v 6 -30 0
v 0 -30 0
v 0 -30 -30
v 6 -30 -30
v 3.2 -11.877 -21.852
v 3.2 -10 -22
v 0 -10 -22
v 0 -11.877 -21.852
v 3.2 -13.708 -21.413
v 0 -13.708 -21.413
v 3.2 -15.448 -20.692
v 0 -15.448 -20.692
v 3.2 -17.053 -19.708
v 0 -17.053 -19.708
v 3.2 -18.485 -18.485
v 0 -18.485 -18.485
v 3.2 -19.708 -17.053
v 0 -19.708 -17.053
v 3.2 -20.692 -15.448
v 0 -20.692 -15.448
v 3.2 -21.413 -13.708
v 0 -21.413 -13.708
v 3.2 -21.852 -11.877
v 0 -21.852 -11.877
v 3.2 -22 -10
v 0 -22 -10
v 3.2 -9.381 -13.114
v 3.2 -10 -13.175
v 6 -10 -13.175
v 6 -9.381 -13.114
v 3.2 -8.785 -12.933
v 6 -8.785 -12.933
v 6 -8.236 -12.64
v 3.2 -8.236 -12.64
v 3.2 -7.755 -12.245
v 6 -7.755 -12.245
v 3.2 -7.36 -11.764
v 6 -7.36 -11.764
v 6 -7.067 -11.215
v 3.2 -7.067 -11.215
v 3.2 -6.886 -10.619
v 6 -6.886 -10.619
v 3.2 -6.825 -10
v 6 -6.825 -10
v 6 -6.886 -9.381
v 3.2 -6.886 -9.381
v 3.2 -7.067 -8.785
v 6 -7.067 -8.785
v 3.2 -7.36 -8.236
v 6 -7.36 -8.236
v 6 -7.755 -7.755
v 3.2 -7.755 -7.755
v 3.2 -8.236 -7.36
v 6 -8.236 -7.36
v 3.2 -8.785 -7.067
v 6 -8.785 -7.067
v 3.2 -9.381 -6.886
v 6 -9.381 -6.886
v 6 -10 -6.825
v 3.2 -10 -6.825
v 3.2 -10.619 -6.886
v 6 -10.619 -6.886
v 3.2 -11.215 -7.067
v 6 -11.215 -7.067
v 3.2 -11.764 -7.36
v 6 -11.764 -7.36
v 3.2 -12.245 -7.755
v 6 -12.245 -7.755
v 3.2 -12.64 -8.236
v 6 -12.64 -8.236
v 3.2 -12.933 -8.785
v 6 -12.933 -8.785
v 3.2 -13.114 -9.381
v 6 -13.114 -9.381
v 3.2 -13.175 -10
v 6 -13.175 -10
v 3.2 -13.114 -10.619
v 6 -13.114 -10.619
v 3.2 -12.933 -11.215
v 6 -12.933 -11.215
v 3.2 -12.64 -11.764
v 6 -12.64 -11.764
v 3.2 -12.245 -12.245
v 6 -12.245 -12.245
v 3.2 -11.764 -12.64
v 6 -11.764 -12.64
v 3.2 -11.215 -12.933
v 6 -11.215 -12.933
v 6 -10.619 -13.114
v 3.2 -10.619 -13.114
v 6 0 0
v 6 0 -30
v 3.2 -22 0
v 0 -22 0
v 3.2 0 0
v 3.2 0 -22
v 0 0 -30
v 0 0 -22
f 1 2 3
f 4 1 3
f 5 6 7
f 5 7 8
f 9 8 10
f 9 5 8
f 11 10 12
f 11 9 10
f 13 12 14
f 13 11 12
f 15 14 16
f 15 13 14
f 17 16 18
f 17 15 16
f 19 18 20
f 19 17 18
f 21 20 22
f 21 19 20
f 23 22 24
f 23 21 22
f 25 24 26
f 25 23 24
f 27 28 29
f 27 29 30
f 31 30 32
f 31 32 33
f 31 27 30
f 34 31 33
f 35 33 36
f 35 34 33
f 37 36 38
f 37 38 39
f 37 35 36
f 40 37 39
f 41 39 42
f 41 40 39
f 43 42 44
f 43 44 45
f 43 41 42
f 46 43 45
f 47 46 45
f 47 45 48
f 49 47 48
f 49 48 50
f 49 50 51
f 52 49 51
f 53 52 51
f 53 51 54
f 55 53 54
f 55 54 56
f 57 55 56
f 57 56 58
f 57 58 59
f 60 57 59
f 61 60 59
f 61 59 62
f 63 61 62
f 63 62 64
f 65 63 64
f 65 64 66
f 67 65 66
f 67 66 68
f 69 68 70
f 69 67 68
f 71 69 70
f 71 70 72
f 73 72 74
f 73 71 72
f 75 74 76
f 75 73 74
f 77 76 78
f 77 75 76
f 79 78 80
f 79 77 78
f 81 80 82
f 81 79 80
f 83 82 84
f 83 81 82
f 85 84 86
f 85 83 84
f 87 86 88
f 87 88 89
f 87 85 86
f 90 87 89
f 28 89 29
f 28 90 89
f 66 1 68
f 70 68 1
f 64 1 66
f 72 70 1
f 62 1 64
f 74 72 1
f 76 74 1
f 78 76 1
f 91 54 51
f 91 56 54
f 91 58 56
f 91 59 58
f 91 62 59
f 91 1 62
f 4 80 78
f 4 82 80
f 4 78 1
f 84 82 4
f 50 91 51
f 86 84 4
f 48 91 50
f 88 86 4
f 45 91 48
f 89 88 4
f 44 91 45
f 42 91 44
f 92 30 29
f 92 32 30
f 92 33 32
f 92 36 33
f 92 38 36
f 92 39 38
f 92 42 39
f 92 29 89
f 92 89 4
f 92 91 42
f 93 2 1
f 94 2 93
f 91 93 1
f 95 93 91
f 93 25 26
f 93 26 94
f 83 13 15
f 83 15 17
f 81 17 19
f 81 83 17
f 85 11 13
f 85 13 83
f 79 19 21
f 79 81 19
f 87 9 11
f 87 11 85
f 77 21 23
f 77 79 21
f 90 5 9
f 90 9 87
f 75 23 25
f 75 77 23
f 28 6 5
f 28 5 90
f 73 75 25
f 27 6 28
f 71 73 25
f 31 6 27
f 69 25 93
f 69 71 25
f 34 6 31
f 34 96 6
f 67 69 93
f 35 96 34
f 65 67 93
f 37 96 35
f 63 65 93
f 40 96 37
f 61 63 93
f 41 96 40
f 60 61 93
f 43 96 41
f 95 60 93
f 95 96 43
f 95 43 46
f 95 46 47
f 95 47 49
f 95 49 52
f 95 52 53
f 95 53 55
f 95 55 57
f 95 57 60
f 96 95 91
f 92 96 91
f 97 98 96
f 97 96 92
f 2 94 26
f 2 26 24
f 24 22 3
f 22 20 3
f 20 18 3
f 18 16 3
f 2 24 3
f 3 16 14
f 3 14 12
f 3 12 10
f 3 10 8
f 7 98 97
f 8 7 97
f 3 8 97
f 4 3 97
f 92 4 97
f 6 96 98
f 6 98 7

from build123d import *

# Parameters (mm, degrees)
SKETCH2_W               = 30
SKETCH2_H               = 30
SKETCH2_R               = 3.175
BOSS_EXTRUDE1_DEPTH     = 6
CUT_EXTRUDE1_DEPTH      = 43.848570571
CUT_EXTRUDE1_DEPTH_BACK = 3.2
SKETCH3_R               = 3.175


with BuildPart() as part:
    # Sketch2 → Boss-Extrude1 (new body)
    with BuildSketch(Plane(origin=(0, 0, 0), x_dir=(0, 0, -1), z_dir=(1, 0, 0))):
        with Locations((15, -15)):
            Rectangle(SKETCH2_W, SKETCH2_H)
        with Locations((10, -10)):
            Circle(SKETCH2_R, mode=Mode.SUBTRACT)
    extrude(amount=BOSS_EXTRUDE1_DEPTH)

    # Sketch3 → Cut-Extrude1 (cut, two sides: drawn at the far end of the back side and taken through both)
    with BuildSketch(Plane.ZY.offset(-CUT_EXTRUDE1_DEPTH_BACK)):
        with BuildLine():
            Line((-22, 0), (-22, -10))
            ThreePointArc((-22, -10), (-18.485281374, -18.485281374), (-10, -22))
            Line((-10, -22), (0, -22))
            Line((0, -22), (0, 0))
            Line((0, 0), (-22, 0))
        make_face()
        with Locations((-10, -10)):
            Circle(SKETCH3_R, mode=Mode.SUBTRACT)
    extrude(amount=CUT_EXTRUDE1_DEPTH + CUT_EXTRUDE1_DEPTH_BACK, mode=Mode.SUBTRACT)


solid = part.part
